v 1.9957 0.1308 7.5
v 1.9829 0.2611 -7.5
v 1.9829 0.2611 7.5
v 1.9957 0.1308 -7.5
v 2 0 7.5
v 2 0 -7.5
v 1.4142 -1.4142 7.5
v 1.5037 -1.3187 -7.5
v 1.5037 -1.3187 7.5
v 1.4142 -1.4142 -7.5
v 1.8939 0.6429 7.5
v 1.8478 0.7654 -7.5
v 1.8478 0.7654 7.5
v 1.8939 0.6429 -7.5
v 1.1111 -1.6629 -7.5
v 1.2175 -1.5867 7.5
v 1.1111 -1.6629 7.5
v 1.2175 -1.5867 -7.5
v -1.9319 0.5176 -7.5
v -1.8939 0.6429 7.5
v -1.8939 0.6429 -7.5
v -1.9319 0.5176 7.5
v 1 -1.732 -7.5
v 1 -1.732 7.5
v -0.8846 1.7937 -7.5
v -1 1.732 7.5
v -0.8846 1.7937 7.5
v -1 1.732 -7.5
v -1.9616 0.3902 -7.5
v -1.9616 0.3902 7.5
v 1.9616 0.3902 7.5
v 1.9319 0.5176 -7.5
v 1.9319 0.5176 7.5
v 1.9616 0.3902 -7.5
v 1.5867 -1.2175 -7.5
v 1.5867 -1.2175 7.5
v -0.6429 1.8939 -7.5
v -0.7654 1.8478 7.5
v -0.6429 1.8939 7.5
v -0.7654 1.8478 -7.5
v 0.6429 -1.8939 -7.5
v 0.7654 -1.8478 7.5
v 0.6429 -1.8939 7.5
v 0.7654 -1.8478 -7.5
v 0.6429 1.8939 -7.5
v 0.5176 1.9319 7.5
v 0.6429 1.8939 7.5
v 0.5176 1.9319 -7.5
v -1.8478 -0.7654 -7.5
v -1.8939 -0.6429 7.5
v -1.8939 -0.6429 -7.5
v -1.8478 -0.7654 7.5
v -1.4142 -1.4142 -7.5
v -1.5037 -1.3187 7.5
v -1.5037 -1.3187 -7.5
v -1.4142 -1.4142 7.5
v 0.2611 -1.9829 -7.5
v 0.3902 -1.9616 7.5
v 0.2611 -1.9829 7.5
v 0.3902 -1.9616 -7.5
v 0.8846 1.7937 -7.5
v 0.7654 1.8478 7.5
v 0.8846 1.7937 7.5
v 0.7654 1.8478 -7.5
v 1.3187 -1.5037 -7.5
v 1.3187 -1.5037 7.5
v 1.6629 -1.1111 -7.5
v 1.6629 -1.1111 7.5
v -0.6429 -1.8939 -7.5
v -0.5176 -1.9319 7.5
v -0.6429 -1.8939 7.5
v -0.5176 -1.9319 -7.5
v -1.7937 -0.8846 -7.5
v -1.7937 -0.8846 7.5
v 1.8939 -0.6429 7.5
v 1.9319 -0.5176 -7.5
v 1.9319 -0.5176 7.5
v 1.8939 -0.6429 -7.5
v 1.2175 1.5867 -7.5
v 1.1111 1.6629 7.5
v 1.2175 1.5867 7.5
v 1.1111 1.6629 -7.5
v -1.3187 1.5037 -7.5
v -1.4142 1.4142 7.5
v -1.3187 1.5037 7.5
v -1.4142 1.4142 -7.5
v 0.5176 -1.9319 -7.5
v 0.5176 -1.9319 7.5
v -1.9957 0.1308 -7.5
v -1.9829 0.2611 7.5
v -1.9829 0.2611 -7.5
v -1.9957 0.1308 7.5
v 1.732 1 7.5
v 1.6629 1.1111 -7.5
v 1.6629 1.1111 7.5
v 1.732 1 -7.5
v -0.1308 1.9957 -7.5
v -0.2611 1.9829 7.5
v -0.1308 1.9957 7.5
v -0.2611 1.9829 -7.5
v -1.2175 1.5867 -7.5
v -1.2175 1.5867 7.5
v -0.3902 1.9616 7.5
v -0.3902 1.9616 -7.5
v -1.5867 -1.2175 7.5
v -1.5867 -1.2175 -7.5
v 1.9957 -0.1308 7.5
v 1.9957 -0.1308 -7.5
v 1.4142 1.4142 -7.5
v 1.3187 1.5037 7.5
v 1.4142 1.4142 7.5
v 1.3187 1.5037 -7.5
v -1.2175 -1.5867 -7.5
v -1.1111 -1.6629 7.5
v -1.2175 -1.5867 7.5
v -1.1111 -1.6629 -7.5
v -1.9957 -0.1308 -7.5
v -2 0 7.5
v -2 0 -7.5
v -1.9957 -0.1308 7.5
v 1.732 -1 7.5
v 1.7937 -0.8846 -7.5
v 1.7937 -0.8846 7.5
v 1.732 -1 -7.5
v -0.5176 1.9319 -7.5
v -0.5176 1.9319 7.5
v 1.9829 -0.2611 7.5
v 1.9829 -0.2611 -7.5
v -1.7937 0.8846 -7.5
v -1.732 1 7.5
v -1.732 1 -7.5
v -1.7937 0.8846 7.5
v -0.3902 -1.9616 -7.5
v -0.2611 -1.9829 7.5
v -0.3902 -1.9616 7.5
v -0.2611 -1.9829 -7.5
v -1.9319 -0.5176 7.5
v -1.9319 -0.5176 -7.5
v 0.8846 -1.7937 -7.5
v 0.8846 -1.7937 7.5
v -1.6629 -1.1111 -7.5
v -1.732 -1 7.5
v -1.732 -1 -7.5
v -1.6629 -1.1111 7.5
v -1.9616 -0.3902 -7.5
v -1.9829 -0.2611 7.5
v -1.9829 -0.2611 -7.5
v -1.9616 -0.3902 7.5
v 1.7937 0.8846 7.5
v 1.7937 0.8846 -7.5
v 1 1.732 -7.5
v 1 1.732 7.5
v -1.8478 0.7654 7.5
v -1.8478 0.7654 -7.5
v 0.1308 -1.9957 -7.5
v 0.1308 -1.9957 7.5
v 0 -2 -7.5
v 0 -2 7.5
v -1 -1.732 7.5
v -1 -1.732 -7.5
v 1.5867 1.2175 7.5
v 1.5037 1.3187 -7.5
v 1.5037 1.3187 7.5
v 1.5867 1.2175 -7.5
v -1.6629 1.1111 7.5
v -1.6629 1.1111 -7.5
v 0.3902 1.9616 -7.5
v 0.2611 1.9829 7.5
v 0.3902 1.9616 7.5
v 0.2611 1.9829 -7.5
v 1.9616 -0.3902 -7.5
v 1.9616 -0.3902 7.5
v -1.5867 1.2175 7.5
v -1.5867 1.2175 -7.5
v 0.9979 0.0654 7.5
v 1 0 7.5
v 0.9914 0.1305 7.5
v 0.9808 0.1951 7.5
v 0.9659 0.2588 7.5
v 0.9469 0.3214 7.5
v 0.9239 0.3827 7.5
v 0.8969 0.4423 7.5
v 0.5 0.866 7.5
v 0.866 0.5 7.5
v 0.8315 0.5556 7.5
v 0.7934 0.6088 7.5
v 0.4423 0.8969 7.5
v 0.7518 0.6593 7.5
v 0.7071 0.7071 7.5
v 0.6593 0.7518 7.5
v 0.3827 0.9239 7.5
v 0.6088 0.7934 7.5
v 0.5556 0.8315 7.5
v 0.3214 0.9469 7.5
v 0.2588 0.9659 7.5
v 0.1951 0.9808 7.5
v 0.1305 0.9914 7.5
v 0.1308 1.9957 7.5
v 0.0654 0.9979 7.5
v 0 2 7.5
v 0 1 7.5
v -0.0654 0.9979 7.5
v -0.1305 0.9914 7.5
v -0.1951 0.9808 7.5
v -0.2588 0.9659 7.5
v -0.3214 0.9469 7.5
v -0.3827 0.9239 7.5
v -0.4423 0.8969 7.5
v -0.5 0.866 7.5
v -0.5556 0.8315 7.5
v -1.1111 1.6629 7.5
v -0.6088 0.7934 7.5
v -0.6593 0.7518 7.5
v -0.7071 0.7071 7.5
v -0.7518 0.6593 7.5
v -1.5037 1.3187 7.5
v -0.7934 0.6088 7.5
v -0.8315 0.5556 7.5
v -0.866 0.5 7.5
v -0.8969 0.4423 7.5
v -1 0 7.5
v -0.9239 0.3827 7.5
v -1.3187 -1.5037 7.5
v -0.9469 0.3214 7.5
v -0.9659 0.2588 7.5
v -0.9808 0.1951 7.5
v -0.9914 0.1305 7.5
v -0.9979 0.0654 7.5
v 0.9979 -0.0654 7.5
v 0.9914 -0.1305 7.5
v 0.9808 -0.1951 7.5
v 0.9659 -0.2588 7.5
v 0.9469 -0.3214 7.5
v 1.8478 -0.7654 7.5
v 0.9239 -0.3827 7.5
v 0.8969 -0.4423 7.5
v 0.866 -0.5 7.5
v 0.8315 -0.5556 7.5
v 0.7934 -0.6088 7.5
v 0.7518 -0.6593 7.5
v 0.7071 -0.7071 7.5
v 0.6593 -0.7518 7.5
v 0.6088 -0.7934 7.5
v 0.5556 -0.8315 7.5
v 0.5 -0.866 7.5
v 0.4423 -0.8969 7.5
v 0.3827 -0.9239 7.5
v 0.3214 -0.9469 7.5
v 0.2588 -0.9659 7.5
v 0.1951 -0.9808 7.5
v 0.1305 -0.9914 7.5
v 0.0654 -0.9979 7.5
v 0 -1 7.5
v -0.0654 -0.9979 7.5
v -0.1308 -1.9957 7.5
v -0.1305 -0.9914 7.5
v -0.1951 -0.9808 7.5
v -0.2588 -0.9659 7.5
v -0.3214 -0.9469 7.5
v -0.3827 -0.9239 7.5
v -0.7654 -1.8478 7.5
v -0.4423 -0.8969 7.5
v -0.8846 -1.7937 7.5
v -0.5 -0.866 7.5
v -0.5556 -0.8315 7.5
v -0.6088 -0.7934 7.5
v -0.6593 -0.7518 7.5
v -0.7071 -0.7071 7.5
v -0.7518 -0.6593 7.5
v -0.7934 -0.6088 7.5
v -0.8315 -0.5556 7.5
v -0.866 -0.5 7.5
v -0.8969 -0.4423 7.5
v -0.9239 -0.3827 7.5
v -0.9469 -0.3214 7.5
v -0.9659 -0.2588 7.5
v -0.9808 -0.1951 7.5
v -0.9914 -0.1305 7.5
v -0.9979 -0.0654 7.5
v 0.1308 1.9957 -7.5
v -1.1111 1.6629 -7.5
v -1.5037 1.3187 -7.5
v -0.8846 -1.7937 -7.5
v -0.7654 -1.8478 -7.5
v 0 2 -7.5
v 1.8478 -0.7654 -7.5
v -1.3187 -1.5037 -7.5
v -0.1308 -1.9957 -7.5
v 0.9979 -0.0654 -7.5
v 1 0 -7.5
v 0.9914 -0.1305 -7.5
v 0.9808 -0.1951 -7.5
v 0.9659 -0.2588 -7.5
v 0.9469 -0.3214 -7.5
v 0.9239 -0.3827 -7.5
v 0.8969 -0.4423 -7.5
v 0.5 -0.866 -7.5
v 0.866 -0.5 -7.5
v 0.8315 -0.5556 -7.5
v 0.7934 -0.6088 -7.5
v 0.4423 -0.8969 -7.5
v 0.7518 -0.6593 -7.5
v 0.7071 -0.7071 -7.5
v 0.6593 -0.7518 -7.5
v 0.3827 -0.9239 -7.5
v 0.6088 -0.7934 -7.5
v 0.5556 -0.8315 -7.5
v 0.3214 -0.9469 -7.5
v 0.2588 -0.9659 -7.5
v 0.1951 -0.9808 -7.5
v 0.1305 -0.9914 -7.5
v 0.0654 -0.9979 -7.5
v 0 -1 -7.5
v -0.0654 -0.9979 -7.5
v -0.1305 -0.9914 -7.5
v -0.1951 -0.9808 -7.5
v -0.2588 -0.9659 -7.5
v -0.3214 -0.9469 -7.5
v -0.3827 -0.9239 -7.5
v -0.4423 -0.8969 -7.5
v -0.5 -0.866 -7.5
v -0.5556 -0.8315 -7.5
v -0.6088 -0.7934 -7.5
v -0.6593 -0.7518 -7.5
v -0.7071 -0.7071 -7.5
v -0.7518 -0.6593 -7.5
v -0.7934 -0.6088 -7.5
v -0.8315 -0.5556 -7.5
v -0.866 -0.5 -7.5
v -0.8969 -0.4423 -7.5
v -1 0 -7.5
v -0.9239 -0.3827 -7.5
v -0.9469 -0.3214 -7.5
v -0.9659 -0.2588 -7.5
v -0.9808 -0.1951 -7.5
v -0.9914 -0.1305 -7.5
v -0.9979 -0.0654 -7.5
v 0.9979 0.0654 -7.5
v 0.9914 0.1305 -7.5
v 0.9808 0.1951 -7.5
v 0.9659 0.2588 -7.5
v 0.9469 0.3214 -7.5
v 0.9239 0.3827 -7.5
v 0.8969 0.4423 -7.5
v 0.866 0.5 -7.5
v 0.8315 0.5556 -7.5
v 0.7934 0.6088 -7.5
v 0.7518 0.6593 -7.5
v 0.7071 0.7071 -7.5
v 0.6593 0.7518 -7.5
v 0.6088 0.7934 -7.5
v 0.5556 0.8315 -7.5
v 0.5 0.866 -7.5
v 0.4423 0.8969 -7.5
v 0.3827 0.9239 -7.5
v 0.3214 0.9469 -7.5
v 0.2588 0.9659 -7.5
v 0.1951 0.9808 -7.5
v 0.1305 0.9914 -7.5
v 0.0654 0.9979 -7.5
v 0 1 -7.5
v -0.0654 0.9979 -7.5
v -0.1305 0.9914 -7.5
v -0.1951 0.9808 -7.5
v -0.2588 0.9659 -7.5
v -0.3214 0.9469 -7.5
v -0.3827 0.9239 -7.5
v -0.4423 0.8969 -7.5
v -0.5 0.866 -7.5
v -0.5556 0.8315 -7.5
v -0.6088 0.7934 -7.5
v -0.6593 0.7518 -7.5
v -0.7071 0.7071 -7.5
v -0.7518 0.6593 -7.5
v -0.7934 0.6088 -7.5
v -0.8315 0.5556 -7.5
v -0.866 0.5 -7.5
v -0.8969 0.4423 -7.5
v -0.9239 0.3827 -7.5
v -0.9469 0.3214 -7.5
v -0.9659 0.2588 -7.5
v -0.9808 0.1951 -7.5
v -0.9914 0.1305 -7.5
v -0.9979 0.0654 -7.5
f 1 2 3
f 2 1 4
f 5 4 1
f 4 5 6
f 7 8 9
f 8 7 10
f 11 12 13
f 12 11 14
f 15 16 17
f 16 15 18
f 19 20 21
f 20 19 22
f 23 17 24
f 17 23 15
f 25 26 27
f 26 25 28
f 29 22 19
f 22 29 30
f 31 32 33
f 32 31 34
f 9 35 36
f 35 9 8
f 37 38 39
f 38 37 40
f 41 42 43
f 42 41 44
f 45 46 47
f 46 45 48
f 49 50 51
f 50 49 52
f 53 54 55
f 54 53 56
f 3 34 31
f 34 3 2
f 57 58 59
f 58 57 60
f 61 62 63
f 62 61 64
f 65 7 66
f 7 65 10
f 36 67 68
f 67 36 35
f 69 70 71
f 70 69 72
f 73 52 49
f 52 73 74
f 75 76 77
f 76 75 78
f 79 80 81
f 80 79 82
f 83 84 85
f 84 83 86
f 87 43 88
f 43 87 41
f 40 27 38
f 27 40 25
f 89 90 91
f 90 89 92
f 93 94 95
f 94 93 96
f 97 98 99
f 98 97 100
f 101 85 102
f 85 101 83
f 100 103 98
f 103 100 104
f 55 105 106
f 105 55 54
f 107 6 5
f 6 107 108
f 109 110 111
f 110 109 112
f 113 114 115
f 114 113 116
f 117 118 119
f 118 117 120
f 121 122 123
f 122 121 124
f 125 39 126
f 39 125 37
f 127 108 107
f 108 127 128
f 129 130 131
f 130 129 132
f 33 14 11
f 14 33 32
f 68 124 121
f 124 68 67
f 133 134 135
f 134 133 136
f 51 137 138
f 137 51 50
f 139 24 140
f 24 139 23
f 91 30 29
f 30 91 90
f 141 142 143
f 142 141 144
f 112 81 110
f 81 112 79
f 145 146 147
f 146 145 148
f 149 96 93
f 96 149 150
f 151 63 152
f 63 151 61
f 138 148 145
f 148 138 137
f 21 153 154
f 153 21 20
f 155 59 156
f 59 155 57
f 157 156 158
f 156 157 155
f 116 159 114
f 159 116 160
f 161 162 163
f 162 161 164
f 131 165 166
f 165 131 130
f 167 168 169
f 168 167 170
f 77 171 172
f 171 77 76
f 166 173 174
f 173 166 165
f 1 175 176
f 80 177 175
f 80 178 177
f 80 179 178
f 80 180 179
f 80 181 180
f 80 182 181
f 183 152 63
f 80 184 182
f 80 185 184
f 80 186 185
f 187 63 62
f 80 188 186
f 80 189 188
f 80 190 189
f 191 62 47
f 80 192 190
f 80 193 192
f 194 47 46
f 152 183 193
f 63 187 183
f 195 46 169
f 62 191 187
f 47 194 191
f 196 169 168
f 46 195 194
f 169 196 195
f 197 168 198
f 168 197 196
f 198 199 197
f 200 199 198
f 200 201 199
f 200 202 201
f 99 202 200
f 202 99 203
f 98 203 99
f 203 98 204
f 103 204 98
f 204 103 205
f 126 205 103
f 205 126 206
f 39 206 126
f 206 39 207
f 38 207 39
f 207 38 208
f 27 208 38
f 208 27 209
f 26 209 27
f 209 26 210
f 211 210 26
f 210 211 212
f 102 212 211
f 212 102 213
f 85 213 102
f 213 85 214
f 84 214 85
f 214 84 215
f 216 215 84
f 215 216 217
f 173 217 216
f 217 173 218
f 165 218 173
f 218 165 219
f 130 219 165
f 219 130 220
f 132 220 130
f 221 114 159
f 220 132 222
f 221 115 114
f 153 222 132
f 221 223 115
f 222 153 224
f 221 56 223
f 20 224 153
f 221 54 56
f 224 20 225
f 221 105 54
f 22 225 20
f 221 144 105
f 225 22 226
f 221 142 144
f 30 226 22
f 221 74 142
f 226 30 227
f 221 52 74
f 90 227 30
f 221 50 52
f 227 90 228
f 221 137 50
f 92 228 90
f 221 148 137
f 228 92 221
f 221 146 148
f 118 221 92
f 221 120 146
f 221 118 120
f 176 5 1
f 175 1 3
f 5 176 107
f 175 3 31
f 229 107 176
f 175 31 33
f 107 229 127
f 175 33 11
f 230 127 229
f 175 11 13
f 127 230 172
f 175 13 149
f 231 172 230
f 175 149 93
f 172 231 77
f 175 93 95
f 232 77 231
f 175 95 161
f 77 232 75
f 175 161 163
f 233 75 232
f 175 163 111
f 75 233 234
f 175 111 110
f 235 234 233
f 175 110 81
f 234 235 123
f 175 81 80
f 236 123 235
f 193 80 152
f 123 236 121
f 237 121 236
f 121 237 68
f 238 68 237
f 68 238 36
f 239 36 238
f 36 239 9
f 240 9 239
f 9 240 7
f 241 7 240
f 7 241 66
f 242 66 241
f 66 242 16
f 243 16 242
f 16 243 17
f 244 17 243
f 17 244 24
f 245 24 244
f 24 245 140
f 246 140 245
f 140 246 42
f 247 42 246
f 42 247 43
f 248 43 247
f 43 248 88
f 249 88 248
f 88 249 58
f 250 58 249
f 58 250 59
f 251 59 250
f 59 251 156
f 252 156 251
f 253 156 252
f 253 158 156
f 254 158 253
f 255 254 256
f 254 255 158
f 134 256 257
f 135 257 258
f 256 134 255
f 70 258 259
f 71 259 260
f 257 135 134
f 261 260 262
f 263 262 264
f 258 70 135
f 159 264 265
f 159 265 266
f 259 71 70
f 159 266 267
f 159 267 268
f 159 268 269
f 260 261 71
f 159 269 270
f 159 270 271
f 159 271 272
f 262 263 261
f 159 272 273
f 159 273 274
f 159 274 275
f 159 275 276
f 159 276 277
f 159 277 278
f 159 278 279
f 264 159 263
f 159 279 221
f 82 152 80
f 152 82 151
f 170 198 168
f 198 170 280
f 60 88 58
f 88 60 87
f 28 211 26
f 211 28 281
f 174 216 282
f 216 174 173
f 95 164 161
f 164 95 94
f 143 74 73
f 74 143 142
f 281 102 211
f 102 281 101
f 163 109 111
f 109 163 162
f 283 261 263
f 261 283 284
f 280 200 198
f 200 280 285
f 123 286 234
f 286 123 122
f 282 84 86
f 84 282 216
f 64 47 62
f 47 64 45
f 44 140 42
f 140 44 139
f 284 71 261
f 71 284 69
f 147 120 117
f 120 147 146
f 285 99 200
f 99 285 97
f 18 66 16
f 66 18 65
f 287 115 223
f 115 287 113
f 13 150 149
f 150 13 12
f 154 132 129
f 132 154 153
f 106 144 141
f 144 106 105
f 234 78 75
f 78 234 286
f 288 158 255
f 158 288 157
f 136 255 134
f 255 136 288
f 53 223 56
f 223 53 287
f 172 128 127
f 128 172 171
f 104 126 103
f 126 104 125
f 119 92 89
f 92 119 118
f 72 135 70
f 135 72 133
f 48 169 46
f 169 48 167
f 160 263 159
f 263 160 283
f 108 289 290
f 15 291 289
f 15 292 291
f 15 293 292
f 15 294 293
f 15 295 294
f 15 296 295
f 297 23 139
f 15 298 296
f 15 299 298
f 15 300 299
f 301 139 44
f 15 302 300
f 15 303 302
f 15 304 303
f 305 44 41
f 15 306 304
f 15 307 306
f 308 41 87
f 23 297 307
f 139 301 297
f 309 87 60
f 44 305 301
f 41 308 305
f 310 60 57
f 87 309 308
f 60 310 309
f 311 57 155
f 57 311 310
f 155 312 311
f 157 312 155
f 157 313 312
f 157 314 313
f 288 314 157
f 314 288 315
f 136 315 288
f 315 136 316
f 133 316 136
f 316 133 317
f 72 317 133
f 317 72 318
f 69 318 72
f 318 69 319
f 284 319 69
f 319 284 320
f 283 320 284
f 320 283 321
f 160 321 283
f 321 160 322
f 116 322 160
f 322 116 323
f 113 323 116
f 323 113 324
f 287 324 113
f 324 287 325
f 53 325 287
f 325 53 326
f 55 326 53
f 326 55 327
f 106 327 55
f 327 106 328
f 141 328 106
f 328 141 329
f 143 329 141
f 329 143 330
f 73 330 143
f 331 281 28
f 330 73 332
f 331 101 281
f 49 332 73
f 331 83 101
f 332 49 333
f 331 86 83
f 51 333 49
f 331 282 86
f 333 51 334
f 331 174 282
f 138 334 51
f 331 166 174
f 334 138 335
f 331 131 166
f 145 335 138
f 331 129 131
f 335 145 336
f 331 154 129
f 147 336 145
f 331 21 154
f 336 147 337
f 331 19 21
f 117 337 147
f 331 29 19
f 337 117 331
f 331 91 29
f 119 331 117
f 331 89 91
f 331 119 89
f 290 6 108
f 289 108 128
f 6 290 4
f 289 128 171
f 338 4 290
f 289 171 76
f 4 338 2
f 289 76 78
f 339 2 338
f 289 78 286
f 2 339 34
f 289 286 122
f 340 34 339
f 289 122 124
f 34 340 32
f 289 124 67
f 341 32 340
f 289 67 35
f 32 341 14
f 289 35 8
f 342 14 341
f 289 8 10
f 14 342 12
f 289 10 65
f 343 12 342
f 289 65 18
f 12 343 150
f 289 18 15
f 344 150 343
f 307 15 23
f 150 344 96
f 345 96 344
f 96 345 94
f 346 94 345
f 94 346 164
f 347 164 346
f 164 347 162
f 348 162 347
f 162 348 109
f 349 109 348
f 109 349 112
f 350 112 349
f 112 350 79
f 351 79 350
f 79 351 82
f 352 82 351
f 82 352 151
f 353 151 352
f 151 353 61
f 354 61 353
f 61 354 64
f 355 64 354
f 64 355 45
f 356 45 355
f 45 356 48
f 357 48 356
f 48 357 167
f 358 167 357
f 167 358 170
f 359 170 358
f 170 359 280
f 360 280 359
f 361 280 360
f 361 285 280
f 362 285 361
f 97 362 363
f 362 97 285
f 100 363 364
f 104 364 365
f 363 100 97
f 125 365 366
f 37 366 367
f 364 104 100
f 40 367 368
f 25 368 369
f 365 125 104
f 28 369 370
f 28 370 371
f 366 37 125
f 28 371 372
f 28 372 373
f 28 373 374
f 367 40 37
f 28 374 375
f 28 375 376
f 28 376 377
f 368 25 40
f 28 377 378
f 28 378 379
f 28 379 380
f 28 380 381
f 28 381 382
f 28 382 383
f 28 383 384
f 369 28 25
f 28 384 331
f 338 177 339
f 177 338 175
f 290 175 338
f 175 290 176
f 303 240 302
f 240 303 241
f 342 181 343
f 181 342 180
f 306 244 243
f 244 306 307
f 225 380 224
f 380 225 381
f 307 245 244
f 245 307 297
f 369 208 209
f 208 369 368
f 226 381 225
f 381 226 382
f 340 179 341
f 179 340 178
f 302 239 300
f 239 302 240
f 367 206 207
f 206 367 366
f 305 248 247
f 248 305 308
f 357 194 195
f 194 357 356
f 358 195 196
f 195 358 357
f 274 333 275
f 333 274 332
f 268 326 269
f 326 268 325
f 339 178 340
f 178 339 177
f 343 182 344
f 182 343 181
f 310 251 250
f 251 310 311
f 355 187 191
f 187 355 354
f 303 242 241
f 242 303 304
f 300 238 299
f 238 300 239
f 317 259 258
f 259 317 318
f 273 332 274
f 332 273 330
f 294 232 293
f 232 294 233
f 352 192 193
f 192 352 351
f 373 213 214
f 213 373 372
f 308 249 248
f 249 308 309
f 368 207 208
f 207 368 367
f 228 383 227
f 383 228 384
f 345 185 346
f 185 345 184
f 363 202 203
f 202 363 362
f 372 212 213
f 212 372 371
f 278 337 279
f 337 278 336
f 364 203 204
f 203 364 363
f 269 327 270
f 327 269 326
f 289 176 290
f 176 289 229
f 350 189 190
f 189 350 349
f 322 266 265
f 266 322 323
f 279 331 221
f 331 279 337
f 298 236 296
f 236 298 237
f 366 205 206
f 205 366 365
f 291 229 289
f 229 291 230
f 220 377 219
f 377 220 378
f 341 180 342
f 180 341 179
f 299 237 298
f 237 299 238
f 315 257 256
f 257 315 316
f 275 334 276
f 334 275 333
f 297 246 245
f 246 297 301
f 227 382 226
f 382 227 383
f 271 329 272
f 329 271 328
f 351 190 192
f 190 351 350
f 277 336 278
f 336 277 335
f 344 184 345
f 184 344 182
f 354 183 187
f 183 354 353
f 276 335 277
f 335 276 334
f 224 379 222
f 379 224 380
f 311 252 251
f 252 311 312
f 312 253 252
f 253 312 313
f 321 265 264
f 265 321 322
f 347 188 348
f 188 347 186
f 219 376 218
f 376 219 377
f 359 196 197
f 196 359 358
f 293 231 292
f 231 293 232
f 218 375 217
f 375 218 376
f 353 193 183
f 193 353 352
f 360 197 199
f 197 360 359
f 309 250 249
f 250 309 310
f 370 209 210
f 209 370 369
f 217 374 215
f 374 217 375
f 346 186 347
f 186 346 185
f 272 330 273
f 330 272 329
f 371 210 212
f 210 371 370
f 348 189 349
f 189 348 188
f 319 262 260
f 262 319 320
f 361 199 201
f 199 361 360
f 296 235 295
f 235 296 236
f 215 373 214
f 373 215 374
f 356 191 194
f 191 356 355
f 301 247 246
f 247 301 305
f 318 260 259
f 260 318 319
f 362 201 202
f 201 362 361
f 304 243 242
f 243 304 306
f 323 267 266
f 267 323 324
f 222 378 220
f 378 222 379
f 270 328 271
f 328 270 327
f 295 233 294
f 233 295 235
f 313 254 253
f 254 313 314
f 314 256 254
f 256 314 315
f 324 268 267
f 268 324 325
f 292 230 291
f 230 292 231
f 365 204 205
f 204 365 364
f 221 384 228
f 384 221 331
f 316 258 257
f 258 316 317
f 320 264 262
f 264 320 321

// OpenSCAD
// Parameters
length = 15; //[8:60:1]
tubing_od = 4; //[2:8:0.5]
tubing_id = 2; //[1:6:0.5]
forced_id = 0; //[0:6:0.5]
center = 1; //[0:1:1]
eps = 0.8; //[0.2:2:0.1]

$fn = 96;

// PTFE Tubing - complete geometry (single connected solid)
module tubing() {
  od = max(tubing_od, 0.01);
  id_req = (forced_id > 0) ? forced_id : tubing_id;
  id = min(max(id_req, 0), od - 0.01); // ensure wall thickness > 0
  z0 = (center == 1) ? 0 : length/2;

  color([0.85, 0.85, 0.8])  // Off-white for PTFE
  translate([0, 0, z0])
    difference() {
      cylinder(h=length, r=od/2, center=true);
      cylinder(h=length + 2*eps, r=id/2, center=true);
    }
}

module assembly() {
  tubing();
}

assembly();
